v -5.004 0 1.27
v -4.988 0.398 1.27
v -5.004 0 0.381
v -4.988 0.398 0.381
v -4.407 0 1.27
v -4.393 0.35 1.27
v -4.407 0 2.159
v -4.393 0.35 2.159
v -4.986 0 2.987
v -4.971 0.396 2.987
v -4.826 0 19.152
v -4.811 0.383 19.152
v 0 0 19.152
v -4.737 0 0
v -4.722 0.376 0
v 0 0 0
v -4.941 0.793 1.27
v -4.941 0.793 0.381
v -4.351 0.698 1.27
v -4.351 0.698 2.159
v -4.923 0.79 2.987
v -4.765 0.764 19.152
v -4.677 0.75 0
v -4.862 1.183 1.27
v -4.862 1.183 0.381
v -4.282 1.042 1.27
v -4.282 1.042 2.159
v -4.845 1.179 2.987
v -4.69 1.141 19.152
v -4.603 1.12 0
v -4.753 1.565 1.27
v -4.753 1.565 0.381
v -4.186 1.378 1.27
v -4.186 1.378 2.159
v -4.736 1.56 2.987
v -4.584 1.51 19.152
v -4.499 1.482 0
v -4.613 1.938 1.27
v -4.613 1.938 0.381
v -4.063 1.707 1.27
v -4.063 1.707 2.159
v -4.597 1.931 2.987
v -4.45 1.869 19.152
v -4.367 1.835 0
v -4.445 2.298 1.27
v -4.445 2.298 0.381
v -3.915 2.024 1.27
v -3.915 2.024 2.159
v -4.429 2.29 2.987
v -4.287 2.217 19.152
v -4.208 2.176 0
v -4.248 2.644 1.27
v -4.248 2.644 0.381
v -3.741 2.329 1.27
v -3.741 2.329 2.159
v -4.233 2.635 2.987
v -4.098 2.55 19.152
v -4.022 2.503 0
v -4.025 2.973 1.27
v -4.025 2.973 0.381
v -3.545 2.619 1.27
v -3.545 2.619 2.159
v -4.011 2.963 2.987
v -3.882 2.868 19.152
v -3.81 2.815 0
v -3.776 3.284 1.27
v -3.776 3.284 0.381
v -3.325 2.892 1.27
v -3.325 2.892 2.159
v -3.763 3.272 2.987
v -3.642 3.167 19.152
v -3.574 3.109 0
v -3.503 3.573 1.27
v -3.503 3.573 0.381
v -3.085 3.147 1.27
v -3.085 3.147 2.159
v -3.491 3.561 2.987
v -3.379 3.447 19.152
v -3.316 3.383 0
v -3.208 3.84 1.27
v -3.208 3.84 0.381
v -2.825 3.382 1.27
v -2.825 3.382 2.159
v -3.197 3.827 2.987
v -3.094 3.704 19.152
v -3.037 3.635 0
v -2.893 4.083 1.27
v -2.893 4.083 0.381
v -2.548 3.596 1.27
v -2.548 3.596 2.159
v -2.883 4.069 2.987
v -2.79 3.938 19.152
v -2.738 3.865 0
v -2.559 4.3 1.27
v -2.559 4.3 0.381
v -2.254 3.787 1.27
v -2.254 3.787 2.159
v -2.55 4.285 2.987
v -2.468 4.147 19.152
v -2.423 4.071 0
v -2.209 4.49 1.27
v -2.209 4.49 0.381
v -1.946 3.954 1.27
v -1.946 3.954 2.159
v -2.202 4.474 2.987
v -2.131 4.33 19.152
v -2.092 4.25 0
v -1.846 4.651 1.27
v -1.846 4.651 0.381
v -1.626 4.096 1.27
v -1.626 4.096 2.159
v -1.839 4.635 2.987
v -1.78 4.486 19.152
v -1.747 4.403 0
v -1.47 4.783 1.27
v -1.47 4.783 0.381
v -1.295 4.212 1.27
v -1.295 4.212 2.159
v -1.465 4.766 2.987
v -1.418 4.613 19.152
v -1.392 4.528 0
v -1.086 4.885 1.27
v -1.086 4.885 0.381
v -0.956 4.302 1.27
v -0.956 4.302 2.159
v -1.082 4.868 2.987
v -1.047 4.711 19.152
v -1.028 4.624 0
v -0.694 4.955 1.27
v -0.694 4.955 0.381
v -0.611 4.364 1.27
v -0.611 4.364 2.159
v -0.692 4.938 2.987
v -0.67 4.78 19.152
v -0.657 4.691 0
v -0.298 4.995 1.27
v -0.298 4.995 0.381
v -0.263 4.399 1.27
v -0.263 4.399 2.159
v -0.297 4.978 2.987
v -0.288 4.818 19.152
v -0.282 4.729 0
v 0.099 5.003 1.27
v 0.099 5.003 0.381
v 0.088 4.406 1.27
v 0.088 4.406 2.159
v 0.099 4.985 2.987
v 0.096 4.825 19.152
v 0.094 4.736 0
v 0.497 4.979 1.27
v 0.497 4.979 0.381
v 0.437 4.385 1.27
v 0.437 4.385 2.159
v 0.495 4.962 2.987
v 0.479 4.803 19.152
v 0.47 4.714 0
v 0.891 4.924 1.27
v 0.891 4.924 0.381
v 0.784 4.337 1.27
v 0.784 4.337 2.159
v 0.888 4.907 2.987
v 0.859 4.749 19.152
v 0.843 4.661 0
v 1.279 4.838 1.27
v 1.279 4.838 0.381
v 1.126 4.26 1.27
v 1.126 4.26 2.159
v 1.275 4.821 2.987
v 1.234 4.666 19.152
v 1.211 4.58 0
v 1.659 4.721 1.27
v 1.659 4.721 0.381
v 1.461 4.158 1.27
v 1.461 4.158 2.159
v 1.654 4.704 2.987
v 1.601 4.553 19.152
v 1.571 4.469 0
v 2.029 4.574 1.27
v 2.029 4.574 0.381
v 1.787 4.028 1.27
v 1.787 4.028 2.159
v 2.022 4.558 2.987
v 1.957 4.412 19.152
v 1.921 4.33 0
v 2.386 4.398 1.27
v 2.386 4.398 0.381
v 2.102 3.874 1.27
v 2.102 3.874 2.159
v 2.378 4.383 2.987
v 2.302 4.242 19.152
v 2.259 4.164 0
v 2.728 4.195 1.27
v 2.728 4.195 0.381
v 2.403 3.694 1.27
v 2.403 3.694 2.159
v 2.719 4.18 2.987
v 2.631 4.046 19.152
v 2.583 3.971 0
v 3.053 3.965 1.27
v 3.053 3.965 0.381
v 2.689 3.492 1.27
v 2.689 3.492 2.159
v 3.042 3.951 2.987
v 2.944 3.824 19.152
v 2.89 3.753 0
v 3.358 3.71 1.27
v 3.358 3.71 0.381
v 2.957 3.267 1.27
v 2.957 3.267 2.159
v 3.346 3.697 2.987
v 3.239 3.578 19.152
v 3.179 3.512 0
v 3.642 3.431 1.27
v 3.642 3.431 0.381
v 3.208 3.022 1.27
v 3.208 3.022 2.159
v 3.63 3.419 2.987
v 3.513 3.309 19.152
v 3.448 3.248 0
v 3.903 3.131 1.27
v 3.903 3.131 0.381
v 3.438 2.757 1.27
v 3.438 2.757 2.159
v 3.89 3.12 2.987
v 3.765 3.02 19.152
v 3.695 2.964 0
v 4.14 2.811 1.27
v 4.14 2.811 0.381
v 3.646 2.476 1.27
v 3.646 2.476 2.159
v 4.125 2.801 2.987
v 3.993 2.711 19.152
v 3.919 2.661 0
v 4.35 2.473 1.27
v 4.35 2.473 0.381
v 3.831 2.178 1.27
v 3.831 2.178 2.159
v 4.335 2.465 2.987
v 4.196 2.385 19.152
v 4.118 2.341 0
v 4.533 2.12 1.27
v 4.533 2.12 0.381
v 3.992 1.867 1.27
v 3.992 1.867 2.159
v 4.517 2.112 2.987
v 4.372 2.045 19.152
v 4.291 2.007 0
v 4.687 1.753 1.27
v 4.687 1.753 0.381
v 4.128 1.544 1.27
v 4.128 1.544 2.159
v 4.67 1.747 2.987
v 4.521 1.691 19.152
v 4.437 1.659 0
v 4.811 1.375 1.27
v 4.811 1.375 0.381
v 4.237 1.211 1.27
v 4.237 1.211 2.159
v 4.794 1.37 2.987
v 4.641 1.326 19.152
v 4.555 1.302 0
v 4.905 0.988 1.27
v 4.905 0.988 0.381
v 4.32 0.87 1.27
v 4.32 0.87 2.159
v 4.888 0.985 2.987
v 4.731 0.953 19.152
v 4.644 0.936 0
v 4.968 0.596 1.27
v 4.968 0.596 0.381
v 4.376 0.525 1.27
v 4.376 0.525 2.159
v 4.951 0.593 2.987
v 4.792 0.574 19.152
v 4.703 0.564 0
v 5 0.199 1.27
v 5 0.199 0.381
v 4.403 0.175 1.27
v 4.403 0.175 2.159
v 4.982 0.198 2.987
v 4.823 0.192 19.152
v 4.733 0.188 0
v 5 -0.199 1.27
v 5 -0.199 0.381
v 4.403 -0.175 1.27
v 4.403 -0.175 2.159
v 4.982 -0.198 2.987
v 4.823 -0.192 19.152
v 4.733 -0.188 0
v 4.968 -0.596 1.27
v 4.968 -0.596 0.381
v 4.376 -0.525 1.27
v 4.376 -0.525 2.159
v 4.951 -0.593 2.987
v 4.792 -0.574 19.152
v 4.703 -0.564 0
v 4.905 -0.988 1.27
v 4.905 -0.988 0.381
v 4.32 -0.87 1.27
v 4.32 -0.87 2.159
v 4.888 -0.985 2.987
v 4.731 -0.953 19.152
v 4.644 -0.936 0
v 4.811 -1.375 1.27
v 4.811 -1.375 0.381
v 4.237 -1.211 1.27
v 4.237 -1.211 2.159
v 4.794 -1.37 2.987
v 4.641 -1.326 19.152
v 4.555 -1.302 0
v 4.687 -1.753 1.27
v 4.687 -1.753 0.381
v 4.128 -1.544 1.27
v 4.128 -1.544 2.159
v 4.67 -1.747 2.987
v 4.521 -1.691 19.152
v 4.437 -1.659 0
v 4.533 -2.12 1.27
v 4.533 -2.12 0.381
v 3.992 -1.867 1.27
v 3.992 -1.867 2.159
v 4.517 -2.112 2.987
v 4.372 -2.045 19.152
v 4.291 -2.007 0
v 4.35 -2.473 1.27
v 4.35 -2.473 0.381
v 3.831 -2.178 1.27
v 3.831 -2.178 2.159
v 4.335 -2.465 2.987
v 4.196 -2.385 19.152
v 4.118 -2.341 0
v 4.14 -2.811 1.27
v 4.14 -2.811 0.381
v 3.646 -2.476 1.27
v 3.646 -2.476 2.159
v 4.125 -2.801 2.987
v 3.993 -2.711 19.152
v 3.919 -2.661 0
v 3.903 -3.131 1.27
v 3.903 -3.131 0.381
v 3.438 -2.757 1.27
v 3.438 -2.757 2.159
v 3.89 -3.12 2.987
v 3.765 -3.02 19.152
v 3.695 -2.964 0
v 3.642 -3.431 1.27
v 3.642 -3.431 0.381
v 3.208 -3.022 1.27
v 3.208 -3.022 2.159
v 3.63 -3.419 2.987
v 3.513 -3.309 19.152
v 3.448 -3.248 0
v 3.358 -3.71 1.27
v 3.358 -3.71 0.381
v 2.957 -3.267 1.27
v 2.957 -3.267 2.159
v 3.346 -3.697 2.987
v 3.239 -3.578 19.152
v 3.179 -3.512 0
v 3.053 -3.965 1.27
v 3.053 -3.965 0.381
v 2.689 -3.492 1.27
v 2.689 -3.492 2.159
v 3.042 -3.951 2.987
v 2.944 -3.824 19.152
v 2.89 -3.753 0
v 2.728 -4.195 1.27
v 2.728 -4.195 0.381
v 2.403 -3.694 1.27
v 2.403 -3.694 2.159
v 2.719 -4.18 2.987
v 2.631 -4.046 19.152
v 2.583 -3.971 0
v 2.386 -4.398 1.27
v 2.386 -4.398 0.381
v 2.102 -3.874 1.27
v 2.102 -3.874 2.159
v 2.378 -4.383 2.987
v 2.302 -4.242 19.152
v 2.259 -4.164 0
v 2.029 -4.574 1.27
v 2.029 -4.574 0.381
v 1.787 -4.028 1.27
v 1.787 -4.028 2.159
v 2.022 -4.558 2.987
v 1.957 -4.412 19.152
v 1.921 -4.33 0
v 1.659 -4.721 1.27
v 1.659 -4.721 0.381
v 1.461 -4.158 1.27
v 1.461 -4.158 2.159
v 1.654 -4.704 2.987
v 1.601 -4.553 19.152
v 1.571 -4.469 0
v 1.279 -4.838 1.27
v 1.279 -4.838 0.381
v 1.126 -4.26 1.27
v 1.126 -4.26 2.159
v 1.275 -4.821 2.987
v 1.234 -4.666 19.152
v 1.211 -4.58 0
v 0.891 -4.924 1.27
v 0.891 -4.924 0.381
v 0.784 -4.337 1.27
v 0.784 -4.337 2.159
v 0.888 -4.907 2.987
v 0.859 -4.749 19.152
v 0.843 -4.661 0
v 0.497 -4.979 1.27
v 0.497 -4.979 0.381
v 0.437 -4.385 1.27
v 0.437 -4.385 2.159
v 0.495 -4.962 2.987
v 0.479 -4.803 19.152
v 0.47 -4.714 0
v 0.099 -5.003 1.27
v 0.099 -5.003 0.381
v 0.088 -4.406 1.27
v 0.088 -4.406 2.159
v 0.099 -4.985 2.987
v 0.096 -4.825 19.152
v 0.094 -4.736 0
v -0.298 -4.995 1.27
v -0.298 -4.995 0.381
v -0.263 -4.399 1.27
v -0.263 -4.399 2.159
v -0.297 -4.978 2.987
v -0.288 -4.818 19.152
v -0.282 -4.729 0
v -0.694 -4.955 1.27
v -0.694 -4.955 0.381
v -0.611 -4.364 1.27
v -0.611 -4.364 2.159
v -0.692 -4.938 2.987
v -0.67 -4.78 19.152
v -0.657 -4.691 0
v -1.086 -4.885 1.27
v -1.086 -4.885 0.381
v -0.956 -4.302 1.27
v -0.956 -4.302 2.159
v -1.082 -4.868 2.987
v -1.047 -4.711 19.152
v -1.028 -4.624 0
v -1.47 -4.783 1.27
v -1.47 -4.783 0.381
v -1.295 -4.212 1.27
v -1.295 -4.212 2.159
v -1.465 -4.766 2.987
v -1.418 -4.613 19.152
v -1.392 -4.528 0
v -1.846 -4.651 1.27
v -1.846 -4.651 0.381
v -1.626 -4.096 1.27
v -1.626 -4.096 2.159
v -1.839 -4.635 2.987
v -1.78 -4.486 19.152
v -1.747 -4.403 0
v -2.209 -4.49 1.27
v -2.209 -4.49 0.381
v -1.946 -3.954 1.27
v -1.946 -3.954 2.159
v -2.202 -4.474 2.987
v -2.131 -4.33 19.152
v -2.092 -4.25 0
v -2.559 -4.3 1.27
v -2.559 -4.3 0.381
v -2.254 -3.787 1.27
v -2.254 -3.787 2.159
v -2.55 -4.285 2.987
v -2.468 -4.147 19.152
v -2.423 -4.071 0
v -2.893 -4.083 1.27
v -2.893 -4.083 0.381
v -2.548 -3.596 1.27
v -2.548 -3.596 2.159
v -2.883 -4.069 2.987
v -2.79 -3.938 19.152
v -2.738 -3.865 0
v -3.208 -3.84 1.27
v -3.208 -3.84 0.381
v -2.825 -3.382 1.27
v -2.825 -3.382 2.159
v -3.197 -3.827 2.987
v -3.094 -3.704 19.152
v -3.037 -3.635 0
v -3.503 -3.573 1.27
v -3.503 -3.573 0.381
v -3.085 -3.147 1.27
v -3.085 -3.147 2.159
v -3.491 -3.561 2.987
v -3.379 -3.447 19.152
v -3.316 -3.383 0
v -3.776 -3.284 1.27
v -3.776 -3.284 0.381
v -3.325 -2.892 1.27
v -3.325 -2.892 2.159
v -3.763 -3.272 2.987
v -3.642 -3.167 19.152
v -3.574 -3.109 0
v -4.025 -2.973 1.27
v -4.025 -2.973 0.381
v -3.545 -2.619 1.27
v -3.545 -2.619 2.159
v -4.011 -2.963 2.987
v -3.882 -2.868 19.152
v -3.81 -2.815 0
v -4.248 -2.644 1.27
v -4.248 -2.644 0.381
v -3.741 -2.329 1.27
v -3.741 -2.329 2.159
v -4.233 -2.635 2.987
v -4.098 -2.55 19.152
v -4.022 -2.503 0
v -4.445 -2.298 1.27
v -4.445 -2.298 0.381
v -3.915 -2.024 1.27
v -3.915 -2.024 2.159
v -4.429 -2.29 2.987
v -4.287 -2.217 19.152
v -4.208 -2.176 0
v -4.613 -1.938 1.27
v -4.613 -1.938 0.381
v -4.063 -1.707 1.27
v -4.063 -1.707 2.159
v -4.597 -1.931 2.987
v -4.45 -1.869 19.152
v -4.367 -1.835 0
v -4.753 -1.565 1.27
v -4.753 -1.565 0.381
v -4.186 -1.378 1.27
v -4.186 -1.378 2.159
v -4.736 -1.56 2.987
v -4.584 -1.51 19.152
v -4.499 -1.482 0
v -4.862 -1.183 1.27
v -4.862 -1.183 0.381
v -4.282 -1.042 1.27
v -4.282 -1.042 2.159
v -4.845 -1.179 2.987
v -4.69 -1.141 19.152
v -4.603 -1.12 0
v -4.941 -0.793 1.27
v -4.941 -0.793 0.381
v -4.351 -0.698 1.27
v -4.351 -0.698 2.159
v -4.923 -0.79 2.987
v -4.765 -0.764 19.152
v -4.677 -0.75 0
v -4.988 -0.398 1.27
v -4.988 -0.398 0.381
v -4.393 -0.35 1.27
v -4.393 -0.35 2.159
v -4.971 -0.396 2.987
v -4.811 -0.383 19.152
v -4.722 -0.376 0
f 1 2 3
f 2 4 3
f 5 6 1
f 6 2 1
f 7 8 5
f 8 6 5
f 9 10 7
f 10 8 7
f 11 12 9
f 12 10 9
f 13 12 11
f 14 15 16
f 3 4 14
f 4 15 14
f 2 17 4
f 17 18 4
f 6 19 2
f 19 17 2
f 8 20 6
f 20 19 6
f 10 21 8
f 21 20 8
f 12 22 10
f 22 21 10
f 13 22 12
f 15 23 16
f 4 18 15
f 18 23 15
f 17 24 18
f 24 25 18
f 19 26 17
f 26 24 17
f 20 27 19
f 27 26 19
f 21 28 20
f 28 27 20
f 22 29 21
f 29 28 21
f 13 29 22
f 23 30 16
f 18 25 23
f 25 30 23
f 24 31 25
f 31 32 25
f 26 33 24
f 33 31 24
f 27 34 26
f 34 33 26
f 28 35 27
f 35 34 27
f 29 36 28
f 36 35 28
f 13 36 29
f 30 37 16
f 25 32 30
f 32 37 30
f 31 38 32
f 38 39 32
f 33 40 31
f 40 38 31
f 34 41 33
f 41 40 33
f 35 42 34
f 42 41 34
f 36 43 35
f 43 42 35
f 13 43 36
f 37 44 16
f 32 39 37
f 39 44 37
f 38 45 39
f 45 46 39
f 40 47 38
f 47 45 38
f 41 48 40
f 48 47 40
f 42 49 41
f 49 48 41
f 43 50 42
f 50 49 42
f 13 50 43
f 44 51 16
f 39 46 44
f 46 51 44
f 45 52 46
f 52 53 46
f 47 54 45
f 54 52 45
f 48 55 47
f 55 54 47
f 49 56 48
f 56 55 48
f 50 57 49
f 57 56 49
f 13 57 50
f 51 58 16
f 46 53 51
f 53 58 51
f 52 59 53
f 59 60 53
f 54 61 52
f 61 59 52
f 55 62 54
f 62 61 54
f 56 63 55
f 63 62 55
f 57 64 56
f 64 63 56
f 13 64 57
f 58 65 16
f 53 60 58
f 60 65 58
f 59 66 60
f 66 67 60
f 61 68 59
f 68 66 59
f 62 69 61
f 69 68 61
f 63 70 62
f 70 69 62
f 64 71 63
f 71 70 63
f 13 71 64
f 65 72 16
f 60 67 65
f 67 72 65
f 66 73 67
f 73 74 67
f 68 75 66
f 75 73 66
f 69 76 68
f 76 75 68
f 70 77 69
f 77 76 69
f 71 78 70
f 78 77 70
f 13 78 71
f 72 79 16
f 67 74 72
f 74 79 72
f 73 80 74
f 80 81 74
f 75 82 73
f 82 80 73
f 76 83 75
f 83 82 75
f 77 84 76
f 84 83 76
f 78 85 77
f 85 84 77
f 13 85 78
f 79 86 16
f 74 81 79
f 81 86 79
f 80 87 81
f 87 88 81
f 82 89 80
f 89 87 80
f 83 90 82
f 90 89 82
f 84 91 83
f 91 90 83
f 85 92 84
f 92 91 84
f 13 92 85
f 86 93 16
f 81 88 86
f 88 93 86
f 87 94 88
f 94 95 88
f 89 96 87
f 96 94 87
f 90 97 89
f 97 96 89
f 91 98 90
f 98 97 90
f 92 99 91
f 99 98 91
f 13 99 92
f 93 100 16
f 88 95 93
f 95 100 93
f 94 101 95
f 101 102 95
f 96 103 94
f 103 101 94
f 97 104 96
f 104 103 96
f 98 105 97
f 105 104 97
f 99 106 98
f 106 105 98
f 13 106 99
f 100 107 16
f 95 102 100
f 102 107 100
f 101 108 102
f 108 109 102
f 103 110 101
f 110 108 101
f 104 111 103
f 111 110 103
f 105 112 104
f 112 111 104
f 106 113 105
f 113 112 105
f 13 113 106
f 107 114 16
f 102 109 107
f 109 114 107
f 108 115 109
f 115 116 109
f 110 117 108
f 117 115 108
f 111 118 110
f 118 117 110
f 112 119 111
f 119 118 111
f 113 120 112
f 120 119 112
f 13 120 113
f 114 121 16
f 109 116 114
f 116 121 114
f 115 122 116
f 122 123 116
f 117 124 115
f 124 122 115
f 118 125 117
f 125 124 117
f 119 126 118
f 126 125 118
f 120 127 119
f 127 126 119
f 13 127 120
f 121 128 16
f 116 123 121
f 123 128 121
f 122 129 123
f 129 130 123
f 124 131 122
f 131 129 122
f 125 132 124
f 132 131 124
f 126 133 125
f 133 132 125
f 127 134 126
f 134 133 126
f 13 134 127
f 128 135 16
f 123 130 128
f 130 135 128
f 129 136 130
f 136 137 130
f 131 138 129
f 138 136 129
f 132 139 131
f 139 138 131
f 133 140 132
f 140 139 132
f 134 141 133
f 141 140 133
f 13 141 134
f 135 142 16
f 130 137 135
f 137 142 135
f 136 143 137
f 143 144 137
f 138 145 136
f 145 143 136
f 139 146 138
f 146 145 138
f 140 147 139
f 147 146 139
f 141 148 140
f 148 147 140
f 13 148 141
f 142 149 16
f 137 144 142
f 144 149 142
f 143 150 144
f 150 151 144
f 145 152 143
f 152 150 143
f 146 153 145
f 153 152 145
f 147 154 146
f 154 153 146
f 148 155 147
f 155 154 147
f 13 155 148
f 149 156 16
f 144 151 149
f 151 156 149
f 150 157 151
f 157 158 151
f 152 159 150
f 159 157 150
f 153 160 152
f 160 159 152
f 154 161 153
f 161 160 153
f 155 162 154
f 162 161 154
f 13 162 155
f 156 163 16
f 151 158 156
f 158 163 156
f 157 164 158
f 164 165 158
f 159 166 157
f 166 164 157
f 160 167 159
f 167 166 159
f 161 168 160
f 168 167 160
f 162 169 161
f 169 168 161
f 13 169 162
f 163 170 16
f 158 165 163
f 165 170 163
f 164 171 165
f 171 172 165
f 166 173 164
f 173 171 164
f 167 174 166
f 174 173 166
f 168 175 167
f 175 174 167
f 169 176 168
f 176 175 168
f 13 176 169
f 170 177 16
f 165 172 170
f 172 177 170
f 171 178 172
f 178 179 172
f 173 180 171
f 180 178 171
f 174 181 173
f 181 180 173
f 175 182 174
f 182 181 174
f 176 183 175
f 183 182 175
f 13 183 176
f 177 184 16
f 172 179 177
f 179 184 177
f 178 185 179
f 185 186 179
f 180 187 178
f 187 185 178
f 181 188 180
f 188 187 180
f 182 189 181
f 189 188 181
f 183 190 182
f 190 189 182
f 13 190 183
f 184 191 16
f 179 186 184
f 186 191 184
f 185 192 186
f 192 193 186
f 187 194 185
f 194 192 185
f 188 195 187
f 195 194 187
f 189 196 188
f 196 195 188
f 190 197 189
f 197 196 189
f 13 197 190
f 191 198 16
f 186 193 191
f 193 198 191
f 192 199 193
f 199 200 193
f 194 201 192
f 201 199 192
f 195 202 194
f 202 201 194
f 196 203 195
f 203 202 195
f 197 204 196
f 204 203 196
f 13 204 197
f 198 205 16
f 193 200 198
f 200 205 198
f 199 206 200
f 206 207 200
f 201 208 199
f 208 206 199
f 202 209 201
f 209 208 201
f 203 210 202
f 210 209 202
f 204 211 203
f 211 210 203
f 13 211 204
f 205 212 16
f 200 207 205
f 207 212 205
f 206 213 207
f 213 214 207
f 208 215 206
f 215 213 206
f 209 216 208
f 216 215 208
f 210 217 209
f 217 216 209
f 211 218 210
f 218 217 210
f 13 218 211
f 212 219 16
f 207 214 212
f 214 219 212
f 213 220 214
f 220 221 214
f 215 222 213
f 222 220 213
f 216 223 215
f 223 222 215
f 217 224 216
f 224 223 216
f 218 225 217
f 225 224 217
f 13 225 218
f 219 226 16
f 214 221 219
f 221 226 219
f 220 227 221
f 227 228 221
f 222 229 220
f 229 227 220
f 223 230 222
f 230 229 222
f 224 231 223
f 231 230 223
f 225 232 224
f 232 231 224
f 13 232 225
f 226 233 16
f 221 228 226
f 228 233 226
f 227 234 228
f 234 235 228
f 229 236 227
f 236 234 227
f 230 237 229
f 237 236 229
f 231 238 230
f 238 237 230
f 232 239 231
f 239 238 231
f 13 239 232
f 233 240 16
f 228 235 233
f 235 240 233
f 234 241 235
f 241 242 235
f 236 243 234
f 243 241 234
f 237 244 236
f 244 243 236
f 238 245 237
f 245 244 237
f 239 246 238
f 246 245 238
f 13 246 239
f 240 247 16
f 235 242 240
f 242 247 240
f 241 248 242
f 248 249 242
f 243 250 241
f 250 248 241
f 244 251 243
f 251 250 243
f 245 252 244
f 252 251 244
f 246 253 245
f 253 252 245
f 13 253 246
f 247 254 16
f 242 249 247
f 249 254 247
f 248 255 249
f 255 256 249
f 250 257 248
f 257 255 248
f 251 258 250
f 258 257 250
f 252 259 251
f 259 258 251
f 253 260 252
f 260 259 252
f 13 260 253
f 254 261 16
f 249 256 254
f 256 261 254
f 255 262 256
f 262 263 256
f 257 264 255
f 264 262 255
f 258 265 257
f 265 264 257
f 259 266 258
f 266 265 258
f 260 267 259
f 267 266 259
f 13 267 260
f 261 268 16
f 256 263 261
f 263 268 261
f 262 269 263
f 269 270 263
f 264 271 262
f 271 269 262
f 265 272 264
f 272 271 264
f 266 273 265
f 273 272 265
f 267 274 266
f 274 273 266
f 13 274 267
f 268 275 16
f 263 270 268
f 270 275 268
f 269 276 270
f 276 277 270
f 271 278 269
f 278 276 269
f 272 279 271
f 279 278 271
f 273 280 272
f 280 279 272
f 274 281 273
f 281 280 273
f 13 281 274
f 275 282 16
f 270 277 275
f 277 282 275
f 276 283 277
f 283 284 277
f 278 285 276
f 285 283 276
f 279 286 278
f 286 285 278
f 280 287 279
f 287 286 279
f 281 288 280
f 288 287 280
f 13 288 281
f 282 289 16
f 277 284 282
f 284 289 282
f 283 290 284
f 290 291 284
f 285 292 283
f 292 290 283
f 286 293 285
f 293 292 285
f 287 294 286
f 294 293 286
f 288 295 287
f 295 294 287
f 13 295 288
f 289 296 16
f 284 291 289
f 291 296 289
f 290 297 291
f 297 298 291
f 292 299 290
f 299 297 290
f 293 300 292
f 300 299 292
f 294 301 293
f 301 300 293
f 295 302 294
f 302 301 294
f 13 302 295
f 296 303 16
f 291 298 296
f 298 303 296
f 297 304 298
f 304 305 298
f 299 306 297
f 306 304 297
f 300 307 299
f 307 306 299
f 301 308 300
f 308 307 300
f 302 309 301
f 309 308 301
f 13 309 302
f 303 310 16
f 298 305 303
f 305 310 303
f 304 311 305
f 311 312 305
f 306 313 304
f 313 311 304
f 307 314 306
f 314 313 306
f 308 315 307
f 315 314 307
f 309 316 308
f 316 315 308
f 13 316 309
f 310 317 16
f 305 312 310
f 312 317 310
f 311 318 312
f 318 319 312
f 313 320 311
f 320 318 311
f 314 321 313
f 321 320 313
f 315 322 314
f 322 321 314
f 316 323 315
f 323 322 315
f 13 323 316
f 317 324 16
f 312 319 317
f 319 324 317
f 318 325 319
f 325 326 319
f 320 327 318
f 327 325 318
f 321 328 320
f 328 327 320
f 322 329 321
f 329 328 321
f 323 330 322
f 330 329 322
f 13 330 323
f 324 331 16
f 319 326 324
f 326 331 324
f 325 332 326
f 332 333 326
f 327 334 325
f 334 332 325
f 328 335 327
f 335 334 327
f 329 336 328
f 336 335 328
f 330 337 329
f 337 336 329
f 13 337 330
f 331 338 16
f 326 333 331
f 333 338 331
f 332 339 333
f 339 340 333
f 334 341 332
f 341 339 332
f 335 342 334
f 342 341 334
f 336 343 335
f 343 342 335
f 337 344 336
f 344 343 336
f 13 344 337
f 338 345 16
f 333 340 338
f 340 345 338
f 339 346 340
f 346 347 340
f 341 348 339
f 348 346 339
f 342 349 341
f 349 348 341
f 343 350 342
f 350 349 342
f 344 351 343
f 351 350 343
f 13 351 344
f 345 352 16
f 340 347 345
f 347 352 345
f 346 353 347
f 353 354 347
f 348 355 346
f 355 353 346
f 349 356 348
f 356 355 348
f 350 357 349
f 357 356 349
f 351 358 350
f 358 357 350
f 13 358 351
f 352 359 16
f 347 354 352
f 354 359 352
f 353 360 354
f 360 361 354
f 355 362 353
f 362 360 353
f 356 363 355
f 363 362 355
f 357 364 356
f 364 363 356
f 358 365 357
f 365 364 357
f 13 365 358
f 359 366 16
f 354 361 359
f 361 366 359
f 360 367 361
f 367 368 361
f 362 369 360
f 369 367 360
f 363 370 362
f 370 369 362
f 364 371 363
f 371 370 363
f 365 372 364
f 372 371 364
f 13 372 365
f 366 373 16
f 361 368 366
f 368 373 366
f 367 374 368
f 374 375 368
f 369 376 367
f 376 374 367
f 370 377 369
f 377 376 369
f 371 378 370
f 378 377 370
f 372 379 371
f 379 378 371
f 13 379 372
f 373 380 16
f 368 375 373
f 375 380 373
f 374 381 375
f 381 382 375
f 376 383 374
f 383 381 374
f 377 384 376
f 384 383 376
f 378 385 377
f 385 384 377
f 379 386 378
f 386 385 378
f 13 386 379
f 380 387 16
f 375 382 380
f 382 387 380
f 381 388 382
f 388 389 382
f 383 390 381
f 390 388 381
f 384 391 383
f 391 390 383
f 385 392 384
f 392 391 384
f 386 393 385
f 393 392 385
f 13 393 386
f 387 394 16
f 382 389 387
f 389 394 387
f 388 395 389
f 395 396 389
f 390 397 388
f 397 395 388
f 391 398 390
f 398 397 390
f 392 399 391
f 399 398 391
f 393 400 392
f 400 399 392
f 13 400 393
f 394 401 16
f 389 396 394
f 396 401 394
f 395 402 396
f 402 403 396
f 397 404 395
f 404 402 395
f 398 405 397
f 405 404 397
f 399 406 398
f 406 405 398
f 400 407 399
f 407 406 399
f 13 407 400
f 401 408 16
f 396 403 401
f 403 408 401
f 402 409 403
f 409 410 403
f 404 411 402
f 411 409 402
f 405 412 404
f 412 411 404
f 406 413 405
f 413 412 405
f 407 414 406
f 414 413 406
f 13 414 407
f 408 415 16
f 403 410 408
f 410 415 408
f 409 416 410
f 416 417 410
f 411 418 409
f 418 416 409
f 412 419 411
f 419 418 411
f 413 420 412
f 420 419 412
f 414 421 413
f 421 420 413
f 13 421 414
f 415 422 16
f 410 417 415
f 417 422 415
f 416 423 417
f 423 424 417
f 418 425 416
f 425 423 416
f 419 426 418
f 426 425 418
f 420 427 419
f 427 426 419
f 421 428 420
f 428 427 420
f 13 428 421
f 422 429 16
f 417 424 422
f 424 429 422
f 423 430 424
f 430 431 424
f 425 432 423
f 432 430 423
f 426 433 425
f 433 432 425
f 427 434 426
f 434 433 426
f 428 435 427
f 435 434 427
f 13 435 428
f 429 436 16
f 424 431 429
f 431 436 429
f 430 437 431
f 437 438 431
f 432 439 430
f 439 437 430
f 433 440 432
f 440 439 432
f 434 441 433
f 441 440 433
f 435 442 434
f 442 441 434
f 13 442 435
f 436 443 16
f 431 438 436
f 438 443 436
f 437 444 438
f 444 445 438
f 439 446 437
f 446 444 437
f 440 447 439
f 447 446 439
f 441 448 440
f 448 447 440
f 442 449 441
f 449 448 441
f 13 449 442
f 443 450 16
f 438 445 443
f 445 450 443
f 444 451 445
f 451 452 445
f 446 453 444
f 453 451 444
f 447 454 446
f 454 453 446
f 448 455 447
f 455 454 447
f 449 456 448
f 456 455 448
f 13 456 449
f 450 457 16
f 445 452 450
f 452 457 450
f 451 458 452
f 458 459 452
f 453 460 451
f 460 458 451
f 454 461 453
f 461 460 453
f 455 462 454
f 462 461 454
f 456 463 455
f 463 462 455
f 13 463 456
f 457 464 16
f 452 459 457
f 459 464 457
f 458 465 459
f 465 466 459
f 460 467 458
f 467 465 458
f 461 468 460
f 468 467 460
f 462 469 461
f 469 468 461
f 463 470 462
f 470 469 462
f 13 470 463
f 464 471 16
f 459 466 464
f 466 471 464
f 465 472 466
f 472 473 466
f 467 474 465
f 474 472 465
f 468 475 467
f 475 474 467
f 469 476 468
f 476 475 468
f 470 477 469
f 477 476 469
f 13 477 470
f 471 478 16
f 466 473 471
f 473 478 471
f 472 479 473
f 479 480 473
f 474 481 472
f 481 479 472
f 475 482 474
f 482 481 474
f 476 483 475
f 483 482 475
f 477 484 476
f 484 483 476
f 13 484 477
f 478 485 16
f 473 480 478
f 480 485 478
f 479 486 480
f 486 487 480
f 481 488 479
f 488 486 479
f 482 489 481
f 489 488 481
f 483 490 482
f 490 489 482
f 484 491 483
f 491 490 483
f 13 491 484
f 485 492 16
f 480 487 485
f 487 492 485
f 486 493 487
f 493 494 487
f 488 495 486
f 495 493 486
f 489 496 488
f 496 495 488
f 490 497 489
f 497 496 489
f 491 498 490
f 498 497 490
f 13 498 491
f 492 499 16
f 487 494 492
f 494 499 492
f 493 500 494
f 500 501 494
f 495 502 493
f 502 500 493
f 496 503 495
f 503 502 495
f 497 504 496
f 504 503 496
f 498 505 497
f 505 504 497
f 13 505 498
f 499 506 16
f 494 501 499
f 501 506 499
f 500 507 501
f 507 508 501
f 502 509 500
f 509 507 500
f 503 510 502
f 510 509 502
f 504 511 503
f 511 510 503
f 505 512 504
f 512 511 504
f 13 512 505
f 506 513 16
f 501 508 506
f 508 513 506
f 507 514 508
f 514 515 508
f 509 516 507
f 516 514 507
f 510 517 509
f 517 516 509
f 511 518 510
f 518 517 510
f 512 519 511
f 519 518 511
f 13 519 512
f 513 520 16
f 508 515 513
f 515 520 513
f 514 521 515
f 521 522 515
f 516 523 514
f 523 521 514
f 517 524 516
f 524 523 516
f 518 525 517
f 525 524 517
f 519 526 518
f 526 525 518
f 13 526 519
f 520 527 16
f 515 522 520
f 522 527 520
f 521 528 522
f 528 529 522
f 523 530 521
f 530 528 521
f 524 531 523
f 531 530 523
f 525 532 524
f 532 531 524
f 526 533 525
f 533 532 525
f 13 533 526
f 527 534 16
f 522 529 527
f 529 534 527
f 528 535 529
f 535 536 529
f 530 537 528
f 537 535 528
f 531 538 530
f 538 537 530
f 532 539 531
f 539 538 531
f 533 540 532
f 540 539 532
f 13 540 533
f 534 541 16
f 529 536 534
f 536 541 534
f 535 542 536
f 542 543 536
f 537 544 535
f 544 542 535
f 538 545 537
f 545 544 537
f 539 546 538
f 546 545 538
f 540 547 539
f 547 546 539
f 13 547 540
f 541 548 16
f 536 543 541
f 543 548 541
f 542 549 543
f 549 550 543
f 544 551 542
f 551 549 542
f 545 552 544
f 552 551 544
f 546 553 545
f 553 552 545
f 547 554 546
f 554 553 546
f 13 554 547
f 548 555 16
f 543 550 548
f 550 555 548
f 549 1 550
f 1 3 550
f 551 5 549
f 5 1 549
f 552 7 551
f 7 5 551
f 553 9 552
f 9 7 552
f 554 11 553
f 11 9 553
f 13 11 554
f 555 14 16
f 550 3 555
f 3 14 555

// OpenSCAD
/* 9x19mm Casing
 *
 * Call externally using ``luger_9x19mm_3d(360);``
 *
 * Dimensions are approximate. 
 * All dimensions are given in inches and degrees unless otherwise 
 * stated and then CONVERTED to millimeters.
 *
 * Created by Andrew Smelser
 * Created on 09-14-2021
 * Updated on 09-14-2021
 */
$fa = 1;	// min. angle of fragment, degrees
$fs = 0.4;	// min. size of fragment, inch

luger_9x19mm_3d(360);

/*================================*/
/*       Module Definitions       */
/*================================*/
module luger_9x19mm_3d(angle=360) {
	/* luger_9x19mm_3d(angle)
	 *
	 * 3D rotated extrusion of the 9mm luger casing
	 * Filled interior; wall thicknesses not calculated or rendered.
	 * All dimensions/measurements in inches
	 *
	 * Inputs
	 * angle: the rotation angle for the 3D object. Default is 360 degrees.
	 */ 
	assert(angle <= 360, "Max angle is 360deg");
	assert(angle > 0, "Minimum angle must be greater than 0");
	rotate_extrude(angle=angle){
		luger_9x19mm_2d();
	};
};

module luger_9x19mm_2d(){
	/* luger_9x19mm_2d()
	 * 
	 * 2-Dimensional approximation of case dimensions for 9mm luger casing.
	 * All dimensions in inches and converted to mm unless otherwise specified.
	 * Dimensions obtained from SAAMI technical specification.
	 * 2D polygon rendered in the +x and +z plane.
	 * 2D Point coordinates obtained from 3D solid model made in SolidWorks. 
	 * 
	 * Coordinate pairs were transformed such that for each [a_i, b_i] the 
	 * coordinate pair was then 25.4*[[b_i, -1*a_i], ...]. This is to compensate 
	 * for how SolidWorks does it's reference planes all weird and to convert 
	 * to mm. 
	 * 
	 * Created by Andrew Smelser
	 * Created on 09-14-2021
	 * Updated on 09-14-2021
	 */
	polygon(points=25.4*[
		[0, 0],
		[0.18649689, 0],
		[0.197, -1*-0.015],
		[0.197, -1*-0.05],
		[0.1735, -1*-0.05],
		[0.1735, -1*-0.085],
		[0.19631591, -1*-0.1175845],
		[0.1955, -1*-0.20],
		[0.19055, -1*-0.70],
		[0.1900154, -1*-0.754],
		[0, -1*-0.754],
		[0, -1*-0.70],
		[0, -1*-0.20],
		[0, 0]]);	// convert to mm
};
